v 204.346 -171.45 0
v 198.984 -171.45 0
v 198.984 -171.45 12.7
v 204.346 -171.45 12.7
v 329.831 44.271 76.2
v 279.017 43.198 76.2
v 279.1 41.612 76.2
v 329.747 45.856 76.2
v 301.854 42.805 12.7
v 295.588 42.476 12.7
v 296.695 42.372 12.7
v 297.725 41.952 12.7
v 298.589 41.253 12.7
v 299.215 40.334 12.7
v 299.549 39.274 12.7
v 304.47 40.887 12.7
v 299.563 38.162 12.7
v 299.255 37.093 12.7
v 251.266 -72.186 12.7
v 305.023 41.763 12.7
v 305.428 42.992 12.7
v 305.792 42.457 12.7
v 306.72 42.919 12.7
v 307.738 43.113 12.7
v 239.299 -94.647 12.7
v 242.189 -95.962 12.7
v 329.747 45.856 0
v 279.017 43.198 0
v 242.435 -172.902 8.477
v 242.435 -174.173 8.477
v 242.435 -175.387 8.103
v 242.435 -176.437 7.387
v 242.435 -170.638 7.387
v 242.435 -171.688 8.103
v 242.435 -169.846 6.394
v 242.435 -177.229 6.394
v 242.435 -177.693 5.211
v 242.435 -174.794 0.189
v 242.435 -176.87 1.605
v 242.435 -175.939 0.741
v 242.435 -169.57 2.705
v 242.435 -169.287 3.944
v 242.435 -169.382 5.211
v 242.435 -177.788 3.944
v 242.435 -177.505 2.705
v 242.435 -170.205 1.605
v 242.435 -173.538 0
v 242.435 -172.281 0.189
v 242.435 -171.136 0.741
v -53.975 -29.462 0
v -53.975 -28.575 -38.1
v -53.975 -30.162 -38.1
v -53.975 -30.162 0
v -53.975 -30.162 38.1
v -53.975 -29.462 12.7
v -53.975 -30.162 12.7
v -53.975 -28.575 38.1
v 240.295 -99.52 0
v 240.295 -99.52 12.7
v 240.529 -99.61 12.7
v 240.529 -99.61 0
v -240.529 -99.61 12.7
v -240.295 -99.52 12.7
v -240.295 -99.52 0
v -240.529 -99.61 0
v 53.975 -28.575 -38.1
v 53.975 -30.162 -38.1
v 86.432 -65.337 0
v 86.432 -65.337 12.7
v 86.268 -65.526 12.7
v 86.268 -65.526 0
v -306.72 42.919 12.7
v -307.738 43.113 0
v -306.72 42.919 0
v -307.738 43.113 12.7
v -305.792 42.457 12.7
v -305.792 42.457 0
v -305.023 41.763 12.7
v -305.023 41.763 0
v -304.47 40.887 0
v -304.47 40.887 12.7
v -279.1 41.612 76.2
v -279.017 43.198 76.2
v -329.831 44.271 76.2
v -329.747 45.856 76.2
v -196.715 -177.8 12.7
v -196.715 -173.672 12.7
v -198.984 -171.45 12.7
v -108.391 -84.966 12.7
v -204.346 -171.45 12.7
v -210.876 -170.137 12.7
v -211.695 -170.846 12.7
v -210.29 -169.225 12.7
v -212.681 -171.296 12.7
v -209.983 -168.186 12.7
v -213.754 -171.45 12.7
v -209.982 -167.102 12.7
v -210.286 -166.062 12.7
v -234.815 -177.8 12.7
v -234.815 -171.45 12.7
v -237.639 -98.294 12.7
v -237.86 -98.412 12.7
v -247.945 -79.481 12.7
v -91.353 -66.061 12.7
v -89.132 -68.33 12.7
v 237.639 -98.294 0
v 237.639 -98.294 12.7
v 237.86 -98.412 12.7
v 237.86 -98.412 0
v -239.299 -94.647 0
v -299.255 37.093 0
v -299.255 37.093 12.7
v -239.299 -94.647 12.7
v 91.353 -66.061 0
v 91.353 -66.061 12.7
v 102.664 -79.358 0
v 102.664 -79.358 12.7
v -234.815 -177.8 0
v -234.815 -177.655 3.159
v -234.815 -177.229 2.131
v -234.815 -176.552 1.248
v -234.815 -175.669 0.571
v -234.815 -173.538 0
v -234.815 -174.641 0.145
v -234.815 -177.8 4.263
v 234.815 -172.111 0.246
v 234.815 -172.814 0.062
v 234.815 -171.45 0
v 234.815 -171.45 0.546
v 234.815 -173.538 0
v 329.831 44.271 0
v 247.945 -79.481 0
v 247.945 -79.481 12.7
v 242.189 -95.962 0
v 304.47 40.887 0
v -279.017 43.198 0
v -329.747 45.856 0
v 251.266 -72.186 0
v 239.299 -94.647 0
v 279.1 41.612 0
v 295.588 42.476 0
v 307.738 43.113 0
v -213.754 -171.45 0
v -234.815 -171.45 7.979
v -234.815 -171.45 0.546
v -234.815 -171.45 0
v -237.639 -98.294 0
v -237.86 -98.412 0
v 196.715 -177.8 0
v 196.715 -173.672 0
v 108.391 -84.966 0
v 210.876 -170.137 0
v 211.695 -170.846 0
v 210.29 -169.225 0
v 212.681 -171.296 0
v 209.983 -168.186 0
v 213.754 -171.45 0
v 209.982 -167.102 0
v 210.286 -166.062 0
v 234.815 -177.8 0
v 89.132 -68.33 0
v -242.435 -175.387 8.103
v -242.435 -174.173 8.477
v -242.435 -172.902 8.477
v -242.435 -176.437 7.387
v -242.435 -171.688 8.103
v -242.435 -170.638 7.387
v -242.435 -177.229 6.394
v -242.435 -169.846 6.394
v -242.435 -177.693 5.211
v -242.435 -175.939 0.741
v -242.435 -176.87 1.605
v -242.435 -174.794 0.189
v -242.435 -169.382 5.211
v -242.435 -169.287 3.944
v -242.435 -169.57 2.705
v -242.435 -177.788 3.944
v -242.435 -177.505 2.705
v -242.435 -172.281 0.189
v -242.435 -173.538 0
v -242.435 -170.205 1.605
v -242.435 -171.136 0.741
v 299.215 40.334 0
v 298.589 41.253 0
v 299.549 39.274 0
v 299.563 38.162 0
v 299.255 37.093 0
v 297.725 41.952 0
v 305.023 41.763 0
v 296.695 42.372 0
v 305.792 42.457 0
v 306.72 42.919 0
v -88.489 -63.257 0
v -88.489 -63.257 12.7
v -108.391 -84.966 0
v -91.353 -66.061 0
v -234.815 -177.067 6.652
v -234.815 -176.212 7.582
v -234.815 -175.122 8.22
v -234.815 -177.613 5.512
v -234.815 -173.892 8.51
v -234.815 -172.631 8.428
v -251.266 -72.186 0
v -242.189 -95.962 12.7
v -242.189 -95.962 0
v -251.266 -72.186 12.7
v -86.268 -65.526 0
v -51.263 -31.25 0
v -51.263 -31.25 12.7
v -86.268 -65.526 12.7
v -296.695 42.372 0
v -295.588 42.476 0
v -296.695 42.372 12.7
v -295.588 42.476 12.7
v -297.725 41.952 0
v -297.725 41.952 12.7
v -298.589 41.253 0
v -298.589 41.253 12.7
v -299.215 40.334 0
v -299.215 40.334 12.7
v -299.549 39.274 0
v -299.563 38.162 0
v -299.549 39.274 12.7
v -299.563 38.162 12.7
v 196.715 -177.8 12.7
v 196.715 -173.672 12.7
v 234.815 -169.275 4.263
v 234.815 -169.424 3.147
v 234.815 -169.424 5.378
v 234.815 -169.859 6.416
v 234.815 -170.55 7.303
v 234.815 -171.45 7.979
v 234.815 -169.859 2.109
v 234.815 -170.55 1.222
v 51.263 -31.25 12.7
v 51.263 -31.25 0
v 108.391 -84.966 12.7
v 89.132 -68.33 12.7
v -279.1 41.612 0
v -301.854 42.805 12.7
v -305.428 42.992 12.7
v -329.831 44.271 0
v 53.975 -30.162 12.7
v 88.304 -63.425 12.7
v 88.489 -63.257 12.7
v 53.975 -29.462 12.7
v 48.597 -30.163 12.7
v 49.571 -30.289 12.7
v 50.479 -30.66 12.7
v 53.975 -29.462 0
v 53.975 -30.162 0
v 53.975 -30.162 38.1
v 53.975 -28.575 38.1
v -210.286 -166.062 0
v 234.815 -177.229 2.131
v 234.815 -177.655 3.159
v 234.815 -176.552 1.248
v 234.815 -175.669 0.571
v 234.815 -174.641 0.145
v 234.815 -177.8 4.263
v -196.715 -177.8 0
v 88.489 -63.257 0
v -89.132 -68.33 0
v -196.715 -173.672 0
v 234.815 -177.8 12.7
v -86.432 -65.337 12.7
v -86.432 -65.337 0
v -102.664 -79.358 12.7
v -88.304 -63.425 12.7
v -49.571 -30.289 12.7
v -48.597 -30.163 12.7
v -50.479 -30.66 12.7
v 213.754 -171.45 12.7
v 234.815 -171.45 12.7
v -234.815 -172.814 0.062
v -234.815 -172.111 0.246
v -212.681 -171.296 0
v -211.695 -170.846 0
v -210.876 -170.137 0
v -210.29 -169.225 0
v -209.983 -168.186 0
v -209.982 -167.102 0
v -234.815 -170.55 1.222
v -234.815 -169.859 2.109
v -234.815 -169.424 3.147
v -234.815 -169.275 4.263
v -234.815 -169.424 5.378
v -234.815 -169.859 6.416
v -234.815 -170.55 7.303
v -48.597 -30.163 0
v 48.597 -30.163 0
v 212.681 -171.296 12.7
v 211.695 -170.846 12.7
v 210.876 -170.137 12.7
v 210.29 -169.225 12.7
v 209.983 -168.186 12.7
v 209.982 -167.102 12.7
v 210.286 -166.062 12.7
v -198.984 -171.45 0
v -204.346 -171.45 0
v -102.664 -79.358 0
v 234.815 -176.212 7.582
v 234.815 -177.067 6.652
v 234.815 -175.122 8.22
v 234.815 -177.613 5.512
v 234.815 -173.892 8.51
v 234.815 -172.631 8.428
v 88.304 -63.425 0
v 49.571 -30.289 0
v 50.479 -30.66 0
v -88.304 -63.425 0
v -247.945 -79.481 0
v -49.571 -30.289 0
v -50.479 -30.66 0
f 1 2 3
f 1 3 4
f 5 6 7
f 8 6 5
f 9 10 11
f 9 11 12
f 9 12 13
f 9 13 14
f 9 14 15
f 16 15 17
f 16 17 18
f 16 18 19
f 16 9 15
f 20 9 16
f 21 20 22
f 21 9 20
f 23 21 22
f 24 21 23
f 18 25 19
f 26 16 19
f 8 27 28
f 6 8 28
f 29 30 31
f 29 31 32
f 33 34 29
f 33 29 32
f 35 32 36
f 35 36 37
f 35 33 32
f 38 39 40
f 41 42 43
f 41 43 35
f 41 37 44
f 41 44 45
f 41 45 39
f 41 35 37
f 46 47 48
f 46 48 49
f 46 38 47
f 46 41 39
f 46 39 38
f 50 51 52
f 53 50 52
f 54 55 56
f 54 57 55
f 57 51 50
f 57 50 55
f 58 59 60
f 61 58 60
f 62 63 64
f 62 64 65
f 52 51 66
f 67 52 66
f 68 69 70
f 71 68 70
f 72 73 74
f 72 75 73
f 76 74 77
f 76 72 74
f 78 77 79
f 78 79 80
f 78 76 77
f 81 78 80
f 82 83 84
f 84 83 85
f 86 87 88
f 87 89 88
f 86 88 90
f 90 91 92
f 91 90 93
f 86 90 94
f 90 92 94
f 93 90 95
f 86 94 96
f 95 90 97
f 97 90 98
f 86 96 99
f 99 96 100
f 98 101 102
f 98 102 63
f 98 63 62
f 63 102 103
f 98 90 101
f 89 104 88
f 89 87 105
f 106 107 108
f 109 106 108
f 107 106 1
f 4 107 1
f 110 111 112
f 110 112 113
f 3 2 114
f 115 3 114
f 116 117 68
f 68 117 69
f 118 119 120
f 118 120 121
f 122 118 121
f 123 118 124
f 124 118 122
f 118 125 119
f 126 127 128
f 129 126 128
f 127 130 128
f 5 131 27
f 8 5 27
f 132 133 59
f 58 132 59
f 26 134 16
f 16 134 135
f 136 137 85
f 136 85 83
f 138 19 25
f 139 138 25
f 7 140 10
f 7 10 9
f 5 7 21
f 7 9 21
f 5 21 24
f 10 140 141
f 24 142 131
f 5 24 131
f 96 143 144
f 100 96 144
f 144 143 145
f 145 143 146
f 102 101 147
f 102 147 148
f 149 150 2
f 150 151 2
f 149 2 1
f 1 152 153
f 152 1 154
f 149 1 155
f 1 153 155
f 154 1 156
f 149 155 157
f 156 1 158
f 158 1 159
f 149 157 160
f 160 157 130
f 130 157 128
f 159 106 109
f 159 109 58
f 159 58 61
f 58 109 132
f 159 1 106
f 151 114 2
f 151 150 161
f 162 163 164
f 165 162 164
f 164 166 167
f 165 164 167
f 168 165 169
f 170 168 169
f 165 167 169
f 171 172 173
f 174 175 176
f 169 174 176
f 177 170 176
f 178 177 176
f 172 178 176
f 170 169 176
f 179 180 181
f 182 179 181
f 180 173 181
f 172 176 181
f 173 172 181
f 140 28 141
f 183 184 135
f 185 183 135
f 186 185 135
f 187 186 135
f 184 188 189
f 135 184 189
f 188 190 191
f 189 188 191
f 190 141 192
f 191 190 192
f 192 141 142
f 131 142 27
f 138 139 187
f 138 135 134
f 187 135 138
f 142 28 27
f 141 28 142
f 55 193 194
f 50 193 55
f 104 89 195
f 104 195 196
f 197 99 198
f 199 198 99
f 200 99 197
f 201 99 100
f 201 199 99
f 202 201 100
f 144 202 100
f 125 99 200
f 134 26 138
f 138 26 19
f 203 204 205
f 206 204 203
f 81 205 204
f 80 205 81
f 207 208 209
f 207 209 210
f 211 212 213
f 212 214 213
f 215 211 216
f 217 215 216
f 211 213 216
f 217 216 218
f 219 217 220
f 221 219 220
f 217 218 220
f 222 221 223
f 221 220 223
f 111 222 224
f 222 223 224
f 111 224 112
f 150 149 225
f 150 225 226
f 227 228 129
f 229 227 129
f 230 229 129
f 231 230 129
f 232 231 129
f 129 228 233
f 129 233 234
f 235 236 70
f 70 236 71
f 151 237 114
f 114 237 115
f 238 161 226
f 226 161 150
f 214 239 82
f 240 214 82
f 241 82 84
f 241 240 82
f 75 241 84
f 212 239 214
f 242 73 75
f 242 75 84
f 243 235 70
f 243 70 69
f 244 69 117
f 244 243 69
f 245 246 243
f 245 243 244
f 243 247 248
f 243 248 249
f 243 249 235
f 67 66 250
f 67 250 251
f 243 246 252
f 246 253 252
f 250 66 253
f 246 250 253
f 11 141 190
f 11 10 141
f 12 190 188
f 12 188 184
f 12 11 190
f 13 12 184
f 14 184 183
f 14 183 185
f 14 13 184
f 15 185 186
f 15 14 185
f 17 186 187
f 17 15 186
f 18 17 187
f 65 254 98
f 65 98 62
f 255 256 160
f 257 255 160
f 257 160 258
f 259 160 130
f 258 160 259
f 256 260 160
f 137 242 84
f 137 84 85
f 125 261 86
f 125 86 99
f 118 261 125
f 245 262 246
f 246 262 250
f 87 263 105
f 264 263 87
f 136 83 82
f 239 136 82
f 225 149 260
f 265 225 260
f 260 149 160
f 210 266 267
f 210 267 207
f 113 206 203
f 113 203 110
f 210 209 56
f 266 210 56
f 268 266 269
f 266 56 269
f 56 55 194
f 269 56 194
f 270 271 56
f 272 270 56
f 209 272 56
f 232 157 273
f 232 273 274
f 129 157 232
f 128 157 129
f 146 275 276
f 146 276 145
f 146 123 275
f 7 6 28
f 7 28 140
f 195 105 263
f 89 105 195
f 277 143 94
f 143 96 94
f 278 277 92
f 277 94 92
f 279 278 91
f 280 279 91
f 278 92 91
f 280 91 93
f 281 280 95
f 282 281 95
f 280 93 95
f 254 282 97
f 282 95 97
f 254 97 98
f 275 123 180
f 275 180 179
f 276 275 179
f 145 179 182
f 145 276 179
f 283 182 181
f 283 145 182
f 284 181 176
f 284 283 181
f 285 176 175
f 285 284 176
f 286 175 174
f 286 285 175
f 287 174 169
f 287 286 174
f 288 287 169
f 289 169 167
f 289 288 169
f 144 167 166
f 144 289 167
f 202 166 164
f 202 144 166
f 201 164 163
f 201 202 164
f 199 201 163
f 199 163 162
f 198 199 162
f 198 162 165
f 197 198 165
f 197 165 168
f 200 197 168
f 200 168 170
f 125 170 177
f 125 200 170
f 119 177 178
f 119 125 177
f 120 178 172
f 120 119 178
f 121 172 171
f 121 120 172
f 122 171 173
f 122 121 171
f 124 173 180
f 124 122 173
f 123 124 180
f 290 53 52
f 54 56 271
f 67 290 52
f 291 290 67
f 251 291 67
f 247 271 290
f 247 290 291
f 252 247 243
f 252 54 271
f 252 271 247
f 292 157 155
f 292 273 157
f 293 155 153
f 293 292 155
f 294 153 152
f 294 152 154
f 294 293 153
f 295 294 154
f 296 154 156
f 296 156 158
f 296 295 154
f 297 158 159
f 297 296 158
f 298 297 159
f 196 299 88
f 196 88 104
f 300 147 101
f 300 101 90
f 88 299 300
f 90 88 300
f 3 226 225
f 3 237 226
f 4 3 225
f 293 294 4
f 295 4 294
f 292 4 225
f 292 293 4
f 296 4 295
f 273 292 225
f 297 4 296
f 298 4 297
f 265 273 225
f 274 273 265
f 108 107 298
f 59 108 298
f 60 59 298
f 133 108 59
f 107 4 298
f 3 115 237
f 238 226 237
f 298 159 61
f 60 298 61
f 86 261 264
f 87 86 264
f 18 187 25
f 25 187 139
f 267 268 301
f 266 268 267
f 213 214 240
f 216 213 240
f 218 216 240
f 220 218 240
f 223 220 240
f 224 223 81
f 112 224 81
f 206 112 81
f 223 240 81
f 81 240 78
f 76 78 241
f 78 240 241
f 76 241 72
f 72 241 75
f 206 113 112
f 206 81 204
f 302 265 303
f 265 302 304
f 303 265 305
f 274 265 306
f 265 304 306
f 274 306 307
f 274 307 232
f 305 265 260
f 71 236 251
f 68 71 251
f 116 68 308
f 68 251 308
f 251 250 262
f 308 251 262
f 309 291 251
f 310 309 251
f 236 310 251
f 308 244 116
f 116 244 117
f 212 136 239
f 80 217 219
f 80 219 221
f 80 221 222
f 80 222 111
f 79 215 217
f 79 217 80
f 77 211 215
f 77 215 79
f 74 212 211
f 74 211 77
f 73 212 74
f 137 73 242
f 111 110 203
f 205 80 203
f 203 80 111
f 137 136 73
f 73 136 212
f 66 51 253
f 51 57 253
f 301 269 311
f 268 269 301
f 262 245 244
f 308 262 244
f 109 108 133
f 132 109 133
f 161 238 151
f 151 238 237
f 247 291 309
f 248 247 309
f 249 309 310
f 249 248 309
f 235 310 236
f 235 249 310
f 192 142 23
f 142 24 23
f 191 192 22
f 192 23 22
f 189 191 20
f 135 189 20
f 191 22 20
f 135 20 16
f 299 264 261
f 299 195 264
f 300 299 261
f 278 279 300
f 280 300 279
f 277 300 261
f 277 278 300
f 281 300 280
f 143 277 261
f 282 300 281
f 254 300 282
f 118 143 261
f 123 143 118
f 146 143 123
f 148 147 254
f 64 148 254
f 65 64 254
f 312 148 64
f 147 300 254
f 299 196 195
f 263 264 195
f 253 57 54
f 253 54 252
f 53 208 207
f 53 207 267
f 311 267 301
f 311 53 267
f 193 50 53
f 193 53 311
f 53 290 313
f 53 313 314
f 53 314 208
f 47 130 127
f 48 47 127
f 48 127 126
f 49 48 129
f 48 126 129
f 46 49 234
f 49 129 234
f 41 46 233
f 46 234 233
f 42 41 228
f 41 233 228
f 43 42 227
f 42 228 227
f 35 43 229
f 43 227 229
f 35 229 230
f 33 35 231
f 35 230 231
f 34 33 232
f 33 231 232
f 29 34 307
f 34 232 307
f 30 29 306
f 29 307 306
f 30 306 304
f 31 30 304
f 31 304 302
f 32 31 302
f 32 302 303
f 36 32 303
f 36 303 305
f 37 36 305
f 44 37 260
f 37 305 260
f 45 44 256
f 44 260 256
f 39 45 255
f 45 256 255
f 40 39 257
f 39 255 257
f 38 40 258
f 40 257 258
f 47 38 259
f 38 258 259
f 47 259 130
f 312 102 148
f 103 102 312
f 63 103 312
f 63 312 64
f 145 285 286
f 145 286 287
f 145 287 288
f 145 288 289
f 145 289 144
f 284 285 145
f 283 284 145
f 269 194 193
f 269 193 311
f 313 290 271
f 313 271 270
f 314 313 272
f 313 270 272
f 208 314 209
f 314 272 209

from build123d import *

# Parameters (mm, degrees)
BOSS_EXTRUDE1_DEPTH  = 38.1
BOSS_EXTRUDE2_DEPTH  = 76.2
SKETCH1_6_W          = 38.1
SKETCH1_6_H          = 6.35
BOSS_EXTRUDE8_DEPTH  = 12.7
BOSS_EXTRUDE9_DEPTH  = 12.7
BOSS_EXTRUDE10_DEPTH = 12.7
SKETCH2_R            = 4.2625
BOSS_EXTRUDE11_DEPTH = 7.62
FILLET1_R            = 3.81
CUT_EXTRUDE1_DEPTH   = 383.370861178


with BuildPart() as part:
    # Sketch1 → Boss-Extrude1 (new, symmetric)
    with BuildSketch(Plane.XY):
        Polygon((0, -28.575), (50.8, -28.575), (53.975, -28.575), (53.975, -30.1625), (0, -30.1625), align=None)
    extrude(amount=BOSS_EXTRUDE1_DEPTH, both=True)



with BuildPart() as body_2:
    # Sketch1<4> → Boss-Extrude2 (new body)
    with BuildSketch(Plane.XY):
        Polygon((279.01709201, 43.197666174), (279.100175341, 41.612341788), (329.830555706, 44.271008365), (329.747472376, 45.856332751), align=None)
    extrude(amount=BOSS_EXTRUDE2_DEPTH)


with BuildPart() as body_3:
    # Sketch1<6> → Boss-Extrude8 (new body)
    with BuildSketch(Plane.XY):
        with Locations((215.764893617, -174.625)):
            Rectangle(SKETCH1_6_W, SKETCH1_6_H)
    extrude(amount=BOSS_EXTRUDE8_DEPTH)


with BuildPart() as part_1:
    add(part.part)

    add(body_3.part)  # Boss-Extrude9 merges body 3
    # Sketch1<7> → Boss-Extrude9 (add)
    with BuildSketch(Plane.XY):
        Polygon((53.975, -30.1625), (50.152203206, -30.1625), (196.714893617, -173.671801028), (196.714893617, -171.45), (198.983967007, -171.45), (53.975, -29.462053139), align=None)
    extrude(amount=BOSS_EXTRUDE9_DEPTH)


    add(body_2.part)  # Boss-Extrude10 merges body 2
    # Sketch1<8> → Boss-Extrude10 (add)
    with BuildSketch(Plane.XY):
        Polygon((301.854344952, 42.804837287), (204.345749685, -171.45), (207.834092561, -171.45), (305.427921483, 42.992120497), align=None)
    extrude(amount=BOSS_EXTRUDE10_DEPTH)

    # Sketch2 → Boss-Extrude11 (add)
    with BuildSketch(Plane(origin=(234.814893617, 0, 0), x_dir=(0, 0, -1), z_dir=(1, 0, 0))):
        with Locations((-4.2625, -173.5375)):
            Circle(SKETCH2_R)
    extrude(amount=BOSS_EXTRUDE11_DEPTH)

    # Fillet1
    fillet1_edges = [part_1.edges().sort_by_distance(p)[0] for p in [
        (305.427921483, 42.992120497, 6.35),
        (301.854344952, 42.804837287, 6.35),
        (207.834092561, -171.45, 6.35),
        (50.152203206, -30.1625, 6.35),
    ]]
    fillet(fillet1_edges, radius=FILLET1_R)

    # Sketch3 → Cut-Extrude1 (cut, through all)
    with BuildSketch(Plane.XY.offset(38.1)):
        Polygon((86.104765819, -65.715259435), (108.391026486, -84.966213434), (88.675205699, -63.090129344), (88.303789567, -63.424868133), (102.66378973, -79.358294111), (86.431612015, -65.33687925), align=None)
        Polygon((237.859879225, -98.412038476), (247.945332781, -79.481446973), (240.295481696, -99.520495016), (240.762601933, -99.698816872), (251.265602721, -72.185845043), (237.418597665, -98.176941507), align=None)
    extrude(amount=-CUT_EXTRUDE1_DEPTH, mode=Mode.SUBTRACT)


with BuildPart() as cut_extrude1_piece_1:
    # of the separate pieces the step leaves, piece 1, a body of its own (cut_extrude1_pieces)
    add(part_1.part.solids().sort_by_distance((237.639238445, -98.294489992, 0))[0])


with BuildPart() as cut_extrude1_piece_2:
    # of the separate pieces the step leaves, piece 2, a body of its own (cut_extrude1_pieces)
    add(part_1.part.solids().sort_by_distance((295.587895579, 42.476426591, 0))[0])


with BuildPart() as cut_extrude1_piece_3:
    # of the separate pieces the step leaves, piece 3, a body of its own (cut_extrude1_pieces)
    add(part_1.part.solids().sort_by_distance((88.489497633, -63.257498738, 0))[0])

    # Mirror1: Cut-Extrude1 piece 3 across plane


with BuildPart() as cut_extrude1_piece_3_1:
    add(cut_extrude1_piece_3.part)
    add(cut_extrude1_piece_3.part.mirror(Plane(origin=(0, 0, 0), x_dir=(0, 0, 1), z_dir=(1, 0, 0))))


with BuildPart() as body_4:
    # Mirror2: mirrored copy
    add(cut_extrude1_piece_1.part.mirror(Plane(origin=(0, 0, 0), x_dir=(0, 0, 1), z_dir=(1, 0, 0))))


with BuildPart() as body_5:
    # Mirror2 2: mirrored copy
    add(cut_extrude1_piece_2.part.mirror(Plane(origin=(0, 0, 0), x_dir=(0, 0, 1), z_dir=(1, 0, 0))))


solid = Compound([cut_extrude1_piece_1.part, cut_extrude1_piece_2.part, cut_extrude1_piece_3_1.part, body_4.part, body_5.part])
